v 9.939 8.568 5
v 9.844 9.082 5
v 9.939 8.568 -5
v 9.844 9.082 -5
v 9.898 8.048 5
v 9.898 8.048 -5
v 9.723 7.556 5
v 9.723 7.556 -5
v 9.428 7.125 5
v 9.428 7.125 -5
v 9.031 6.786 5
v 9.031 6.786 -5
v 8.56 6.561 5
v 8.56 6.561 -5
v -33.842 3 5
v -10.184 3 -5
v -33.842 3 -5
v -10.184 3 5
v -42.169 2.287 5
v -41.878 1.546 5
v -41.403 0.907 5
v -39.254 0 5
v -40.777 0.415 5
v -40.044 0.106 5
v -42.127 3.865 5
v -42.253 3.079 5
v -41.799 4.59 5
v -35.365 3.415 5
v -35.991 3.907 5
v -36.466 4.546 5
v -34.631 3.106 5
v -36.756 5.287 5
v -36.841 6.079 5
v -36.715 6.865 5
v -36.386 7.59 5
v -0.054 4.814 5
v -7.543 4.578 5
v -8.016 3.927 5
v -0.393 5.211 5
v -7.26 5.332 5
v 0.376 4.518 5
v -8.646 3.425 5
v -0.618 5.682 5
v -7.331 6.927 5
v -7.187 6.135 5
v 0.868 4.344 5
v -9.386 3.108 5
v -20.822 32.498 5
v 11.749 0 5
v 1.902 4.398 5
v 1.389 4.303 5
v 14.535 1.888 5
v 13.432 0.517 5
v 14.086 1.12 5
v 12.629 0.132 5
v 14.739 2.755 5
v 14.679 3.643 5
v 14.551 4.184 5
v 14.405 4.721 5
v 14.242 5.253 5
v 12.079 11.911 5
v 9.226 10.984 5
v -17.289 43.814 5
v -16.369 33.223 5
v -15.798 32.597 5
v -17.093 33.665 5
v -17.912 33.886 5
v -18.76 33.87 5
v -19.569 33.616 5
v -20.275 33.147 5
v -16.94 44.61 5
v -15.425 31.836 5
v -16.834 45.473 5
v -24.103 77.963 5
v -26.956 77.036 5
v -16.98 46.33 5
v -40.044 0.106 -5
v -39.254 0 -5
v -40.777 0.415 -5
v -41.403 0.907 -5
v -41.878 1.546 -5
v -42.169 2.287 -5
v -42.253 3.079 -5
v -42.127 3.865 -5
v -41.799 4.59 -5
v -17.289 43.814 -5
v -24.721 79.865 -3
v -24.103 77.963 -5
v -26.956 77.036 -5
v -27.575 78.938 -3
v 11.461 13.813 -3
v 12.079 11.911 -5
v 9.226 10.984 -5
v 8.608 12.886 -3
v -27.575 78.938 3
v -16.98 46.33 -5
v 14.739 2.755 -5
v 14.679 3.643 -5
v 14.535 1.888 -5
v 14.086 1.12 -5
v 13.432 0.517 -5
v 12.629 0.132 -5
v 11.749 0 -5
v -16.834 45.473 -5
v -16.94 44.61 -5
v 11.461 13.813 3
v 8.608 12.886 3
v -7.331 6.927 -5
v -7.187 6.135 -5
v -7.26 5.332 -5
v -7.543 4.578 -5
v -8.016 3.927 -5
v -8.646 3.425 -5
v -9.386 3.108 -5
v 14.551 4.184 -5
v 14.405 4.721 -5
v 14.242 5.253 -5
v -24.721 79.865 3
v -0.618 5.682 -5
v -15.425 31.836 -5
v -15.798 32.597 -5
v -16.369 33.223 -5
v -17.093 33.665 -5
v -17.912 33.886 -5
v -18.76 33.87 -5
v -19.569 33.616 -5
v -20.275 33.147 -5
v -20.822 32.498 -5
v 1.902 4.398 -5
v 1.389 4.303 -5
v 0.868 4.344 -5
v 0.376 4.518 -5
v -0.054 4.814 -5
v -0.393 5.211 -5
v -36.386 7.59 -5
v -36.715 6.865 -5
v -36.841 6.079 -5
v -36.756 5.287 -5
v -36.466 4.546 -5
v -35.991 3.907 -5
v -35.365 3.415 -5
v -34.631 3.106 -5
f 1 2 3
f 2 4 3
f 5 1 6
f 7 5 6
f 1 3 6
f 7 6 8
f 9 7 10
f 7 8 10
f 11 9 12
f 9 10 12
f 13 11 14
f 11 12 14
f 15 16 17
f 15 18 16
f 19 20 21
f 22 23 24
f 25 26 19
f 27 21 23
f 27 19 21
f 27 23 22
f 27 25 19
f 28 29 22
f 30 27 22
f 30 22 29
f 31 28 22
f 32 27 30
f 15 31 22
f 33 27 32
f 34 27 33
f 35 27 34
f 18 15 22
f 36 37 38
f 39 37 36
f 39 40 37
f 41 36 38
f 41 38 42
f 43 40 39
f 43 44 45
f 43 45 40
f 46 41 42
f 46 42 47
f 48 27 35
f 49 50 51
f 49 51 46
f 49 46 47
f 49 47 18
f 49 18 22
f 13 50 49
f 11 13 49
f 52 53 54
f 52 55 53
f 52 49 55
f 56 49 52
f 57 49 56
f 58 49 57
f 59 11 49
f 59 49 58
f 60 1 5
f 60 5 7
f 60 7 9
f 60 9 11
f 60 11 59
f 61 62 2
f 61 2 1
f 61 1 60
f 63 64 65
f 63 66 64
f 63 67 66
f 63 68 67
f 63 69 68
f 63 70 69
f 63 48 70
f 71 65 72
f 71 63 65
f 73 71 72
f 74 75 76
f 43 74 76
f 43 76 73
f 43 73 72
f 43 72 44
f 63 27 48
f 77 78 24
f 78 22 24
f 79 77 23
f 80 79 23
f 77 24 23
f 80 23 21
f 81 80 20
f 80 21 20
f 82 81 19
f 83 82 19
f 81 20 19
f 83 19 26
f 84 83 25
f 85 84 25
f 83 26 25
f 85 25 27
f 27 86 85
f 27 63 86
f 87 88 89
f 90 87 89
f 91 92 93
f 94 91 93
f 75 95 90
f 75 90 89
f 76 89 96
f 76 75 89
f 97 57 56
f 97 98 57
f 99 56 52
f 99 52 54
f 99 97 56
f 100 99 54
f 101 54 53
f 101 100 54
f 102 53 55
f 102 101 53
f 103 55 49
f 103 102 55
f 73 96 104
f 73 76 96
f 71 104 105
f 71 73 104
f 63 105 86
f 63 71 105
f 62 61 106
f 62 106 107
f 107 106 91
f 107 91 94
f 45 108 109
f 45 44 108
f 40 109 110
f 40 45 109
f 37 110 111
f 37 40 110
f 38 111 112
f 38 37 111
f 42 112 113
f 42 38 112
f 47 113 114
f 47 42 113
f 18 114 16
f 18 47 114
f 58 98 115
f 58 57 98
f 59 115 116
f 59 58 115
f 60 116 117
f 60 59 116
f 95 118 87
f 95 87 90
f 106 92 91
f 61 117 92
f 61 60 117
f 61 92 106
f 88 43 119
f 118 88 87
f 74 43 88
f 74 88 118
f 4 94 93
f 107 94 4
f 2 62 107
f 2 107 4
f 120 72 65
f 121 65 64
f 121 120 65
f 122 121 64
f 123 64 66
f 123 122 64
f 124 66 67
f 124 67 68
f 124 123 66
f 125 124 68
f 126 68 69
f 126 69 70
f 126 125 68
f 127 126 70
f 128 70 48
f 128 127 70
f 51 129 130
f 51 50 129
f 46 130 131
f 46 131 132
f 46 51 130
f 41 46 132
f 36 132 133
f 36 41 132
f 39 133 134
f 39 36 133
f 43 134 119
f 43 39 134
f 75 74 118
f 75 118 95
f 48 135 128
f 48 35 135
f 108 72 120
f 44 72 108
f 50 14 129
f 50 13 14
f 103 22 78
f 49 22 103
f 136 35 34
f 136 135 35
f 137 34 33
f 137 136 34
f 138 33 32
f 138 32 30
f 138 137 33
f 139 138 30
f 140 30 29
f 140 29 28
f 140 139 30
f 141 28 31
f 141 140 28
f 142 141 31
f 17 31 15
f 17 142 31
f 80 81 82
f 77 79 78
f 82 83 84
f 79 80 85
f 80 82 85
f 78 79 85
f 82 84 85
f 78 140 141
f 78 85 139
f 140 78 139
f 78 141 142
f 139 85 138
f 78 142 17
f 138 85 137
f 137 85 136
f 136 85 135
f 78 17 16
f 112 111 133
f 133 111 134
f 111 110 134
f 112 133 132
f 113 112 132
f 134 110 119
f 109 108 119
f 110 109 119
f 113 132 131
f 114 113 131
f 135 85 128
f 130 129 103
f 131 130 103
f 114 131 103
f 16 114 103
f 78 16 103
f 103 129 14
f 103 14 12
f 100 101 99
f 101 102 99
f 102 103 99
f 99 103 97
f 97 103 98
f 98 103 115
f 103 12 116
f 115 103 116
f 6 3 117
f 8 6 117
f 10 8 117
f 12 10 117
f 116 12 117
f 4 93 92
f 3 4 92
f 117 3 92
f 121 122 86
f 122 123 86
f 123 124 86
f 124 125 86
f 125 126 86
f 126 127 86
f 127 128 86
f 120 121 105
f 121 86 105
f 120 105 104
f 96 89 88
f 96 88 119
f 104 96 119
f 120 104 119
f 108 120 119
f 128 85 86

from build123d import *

# Parameters (mm, degrees)
F1_DEPTH = 5
F2_SIZE  = 2
F3_R     = 3
F4_R     = 2


with BuildPart() as f1:
    # F0 (on Top) → F1 (new body, symmetric)
    with BuildSketch(Plane.XY):
        with BuildLine():
            Line((10.4616216792, 7.1794074701), (0, 3.780220532))
            Line((0, 3.780220532), (-24.72135955, 79.8647418356))
            Line((-24.72135955, 79.8647418356), (-27.5745290989, 78.9376908525))
            Line((-27.5745290989, 78.9376908525), (-16.5475048962, 45))
            Line((-16.5475048962, 45), (-44.6666257322, 0))
            Line((-44.6666257322, 0), (-1.9261185658, 0))
            Line((-1.9261185658, 0), (15.0738814342, 0))
            ThreePointArc((15.0738814342, 0), (14.8645832244, 2.6593859057), (14.2418422113, 5.2532889044))
            Line((14.2418422113, 5.2532889044), (11.4606892619, 13.812797551))
            Line((11.4606892619, 13.812797551), (8.607519713, 12.8857465679))
            Line((8.607519713, 12.8857465679), (10.4616216792, 7.1794074701))
        make_face()
        Polygon((-6.0552643272, 3), (-39.2544824663, 3), (-17.4126071962, 37.9543071739), align=None, mode=Mode.SUBTRACT)
    extrude(amount=F1_DEPTH, both=True)

    # F2
    f2_edges = [f1.edges().sort_by_distance(p)[0] for p in [
        (10.034104, 13.349272, 5),
        (10.034104, 13.349272, -5),
        (-26.147944, 79.401216, 5),
        (-26.147944, 79.401216, -5),
    ]]
    chamfer(f2_edges, length=F2_SIZE)

    # F3
    f3_edges = [f1.edges().sort_by_distance(p)[0] for p in [
        (-17.412607, 37.954307, 0),
        (-39.254482, 3, 0),
        (-6.055264, 3, 0),
        (-44.666626, 0, 0),
        (-16.547505, 45, 0),
        (15.073881, 0, 0),
    ]]
    fillet(f3_edges, radius=F3_R)

    # F4
    f4_edges = [f1.edges().sort_by_distance(p)[0] for p in [
        (0, 3.780221, 0),
        (10.461622, 7.179407, 0),
    ]]
    fillet(f4_edges, radius=F4_R)


solid = f1.part
